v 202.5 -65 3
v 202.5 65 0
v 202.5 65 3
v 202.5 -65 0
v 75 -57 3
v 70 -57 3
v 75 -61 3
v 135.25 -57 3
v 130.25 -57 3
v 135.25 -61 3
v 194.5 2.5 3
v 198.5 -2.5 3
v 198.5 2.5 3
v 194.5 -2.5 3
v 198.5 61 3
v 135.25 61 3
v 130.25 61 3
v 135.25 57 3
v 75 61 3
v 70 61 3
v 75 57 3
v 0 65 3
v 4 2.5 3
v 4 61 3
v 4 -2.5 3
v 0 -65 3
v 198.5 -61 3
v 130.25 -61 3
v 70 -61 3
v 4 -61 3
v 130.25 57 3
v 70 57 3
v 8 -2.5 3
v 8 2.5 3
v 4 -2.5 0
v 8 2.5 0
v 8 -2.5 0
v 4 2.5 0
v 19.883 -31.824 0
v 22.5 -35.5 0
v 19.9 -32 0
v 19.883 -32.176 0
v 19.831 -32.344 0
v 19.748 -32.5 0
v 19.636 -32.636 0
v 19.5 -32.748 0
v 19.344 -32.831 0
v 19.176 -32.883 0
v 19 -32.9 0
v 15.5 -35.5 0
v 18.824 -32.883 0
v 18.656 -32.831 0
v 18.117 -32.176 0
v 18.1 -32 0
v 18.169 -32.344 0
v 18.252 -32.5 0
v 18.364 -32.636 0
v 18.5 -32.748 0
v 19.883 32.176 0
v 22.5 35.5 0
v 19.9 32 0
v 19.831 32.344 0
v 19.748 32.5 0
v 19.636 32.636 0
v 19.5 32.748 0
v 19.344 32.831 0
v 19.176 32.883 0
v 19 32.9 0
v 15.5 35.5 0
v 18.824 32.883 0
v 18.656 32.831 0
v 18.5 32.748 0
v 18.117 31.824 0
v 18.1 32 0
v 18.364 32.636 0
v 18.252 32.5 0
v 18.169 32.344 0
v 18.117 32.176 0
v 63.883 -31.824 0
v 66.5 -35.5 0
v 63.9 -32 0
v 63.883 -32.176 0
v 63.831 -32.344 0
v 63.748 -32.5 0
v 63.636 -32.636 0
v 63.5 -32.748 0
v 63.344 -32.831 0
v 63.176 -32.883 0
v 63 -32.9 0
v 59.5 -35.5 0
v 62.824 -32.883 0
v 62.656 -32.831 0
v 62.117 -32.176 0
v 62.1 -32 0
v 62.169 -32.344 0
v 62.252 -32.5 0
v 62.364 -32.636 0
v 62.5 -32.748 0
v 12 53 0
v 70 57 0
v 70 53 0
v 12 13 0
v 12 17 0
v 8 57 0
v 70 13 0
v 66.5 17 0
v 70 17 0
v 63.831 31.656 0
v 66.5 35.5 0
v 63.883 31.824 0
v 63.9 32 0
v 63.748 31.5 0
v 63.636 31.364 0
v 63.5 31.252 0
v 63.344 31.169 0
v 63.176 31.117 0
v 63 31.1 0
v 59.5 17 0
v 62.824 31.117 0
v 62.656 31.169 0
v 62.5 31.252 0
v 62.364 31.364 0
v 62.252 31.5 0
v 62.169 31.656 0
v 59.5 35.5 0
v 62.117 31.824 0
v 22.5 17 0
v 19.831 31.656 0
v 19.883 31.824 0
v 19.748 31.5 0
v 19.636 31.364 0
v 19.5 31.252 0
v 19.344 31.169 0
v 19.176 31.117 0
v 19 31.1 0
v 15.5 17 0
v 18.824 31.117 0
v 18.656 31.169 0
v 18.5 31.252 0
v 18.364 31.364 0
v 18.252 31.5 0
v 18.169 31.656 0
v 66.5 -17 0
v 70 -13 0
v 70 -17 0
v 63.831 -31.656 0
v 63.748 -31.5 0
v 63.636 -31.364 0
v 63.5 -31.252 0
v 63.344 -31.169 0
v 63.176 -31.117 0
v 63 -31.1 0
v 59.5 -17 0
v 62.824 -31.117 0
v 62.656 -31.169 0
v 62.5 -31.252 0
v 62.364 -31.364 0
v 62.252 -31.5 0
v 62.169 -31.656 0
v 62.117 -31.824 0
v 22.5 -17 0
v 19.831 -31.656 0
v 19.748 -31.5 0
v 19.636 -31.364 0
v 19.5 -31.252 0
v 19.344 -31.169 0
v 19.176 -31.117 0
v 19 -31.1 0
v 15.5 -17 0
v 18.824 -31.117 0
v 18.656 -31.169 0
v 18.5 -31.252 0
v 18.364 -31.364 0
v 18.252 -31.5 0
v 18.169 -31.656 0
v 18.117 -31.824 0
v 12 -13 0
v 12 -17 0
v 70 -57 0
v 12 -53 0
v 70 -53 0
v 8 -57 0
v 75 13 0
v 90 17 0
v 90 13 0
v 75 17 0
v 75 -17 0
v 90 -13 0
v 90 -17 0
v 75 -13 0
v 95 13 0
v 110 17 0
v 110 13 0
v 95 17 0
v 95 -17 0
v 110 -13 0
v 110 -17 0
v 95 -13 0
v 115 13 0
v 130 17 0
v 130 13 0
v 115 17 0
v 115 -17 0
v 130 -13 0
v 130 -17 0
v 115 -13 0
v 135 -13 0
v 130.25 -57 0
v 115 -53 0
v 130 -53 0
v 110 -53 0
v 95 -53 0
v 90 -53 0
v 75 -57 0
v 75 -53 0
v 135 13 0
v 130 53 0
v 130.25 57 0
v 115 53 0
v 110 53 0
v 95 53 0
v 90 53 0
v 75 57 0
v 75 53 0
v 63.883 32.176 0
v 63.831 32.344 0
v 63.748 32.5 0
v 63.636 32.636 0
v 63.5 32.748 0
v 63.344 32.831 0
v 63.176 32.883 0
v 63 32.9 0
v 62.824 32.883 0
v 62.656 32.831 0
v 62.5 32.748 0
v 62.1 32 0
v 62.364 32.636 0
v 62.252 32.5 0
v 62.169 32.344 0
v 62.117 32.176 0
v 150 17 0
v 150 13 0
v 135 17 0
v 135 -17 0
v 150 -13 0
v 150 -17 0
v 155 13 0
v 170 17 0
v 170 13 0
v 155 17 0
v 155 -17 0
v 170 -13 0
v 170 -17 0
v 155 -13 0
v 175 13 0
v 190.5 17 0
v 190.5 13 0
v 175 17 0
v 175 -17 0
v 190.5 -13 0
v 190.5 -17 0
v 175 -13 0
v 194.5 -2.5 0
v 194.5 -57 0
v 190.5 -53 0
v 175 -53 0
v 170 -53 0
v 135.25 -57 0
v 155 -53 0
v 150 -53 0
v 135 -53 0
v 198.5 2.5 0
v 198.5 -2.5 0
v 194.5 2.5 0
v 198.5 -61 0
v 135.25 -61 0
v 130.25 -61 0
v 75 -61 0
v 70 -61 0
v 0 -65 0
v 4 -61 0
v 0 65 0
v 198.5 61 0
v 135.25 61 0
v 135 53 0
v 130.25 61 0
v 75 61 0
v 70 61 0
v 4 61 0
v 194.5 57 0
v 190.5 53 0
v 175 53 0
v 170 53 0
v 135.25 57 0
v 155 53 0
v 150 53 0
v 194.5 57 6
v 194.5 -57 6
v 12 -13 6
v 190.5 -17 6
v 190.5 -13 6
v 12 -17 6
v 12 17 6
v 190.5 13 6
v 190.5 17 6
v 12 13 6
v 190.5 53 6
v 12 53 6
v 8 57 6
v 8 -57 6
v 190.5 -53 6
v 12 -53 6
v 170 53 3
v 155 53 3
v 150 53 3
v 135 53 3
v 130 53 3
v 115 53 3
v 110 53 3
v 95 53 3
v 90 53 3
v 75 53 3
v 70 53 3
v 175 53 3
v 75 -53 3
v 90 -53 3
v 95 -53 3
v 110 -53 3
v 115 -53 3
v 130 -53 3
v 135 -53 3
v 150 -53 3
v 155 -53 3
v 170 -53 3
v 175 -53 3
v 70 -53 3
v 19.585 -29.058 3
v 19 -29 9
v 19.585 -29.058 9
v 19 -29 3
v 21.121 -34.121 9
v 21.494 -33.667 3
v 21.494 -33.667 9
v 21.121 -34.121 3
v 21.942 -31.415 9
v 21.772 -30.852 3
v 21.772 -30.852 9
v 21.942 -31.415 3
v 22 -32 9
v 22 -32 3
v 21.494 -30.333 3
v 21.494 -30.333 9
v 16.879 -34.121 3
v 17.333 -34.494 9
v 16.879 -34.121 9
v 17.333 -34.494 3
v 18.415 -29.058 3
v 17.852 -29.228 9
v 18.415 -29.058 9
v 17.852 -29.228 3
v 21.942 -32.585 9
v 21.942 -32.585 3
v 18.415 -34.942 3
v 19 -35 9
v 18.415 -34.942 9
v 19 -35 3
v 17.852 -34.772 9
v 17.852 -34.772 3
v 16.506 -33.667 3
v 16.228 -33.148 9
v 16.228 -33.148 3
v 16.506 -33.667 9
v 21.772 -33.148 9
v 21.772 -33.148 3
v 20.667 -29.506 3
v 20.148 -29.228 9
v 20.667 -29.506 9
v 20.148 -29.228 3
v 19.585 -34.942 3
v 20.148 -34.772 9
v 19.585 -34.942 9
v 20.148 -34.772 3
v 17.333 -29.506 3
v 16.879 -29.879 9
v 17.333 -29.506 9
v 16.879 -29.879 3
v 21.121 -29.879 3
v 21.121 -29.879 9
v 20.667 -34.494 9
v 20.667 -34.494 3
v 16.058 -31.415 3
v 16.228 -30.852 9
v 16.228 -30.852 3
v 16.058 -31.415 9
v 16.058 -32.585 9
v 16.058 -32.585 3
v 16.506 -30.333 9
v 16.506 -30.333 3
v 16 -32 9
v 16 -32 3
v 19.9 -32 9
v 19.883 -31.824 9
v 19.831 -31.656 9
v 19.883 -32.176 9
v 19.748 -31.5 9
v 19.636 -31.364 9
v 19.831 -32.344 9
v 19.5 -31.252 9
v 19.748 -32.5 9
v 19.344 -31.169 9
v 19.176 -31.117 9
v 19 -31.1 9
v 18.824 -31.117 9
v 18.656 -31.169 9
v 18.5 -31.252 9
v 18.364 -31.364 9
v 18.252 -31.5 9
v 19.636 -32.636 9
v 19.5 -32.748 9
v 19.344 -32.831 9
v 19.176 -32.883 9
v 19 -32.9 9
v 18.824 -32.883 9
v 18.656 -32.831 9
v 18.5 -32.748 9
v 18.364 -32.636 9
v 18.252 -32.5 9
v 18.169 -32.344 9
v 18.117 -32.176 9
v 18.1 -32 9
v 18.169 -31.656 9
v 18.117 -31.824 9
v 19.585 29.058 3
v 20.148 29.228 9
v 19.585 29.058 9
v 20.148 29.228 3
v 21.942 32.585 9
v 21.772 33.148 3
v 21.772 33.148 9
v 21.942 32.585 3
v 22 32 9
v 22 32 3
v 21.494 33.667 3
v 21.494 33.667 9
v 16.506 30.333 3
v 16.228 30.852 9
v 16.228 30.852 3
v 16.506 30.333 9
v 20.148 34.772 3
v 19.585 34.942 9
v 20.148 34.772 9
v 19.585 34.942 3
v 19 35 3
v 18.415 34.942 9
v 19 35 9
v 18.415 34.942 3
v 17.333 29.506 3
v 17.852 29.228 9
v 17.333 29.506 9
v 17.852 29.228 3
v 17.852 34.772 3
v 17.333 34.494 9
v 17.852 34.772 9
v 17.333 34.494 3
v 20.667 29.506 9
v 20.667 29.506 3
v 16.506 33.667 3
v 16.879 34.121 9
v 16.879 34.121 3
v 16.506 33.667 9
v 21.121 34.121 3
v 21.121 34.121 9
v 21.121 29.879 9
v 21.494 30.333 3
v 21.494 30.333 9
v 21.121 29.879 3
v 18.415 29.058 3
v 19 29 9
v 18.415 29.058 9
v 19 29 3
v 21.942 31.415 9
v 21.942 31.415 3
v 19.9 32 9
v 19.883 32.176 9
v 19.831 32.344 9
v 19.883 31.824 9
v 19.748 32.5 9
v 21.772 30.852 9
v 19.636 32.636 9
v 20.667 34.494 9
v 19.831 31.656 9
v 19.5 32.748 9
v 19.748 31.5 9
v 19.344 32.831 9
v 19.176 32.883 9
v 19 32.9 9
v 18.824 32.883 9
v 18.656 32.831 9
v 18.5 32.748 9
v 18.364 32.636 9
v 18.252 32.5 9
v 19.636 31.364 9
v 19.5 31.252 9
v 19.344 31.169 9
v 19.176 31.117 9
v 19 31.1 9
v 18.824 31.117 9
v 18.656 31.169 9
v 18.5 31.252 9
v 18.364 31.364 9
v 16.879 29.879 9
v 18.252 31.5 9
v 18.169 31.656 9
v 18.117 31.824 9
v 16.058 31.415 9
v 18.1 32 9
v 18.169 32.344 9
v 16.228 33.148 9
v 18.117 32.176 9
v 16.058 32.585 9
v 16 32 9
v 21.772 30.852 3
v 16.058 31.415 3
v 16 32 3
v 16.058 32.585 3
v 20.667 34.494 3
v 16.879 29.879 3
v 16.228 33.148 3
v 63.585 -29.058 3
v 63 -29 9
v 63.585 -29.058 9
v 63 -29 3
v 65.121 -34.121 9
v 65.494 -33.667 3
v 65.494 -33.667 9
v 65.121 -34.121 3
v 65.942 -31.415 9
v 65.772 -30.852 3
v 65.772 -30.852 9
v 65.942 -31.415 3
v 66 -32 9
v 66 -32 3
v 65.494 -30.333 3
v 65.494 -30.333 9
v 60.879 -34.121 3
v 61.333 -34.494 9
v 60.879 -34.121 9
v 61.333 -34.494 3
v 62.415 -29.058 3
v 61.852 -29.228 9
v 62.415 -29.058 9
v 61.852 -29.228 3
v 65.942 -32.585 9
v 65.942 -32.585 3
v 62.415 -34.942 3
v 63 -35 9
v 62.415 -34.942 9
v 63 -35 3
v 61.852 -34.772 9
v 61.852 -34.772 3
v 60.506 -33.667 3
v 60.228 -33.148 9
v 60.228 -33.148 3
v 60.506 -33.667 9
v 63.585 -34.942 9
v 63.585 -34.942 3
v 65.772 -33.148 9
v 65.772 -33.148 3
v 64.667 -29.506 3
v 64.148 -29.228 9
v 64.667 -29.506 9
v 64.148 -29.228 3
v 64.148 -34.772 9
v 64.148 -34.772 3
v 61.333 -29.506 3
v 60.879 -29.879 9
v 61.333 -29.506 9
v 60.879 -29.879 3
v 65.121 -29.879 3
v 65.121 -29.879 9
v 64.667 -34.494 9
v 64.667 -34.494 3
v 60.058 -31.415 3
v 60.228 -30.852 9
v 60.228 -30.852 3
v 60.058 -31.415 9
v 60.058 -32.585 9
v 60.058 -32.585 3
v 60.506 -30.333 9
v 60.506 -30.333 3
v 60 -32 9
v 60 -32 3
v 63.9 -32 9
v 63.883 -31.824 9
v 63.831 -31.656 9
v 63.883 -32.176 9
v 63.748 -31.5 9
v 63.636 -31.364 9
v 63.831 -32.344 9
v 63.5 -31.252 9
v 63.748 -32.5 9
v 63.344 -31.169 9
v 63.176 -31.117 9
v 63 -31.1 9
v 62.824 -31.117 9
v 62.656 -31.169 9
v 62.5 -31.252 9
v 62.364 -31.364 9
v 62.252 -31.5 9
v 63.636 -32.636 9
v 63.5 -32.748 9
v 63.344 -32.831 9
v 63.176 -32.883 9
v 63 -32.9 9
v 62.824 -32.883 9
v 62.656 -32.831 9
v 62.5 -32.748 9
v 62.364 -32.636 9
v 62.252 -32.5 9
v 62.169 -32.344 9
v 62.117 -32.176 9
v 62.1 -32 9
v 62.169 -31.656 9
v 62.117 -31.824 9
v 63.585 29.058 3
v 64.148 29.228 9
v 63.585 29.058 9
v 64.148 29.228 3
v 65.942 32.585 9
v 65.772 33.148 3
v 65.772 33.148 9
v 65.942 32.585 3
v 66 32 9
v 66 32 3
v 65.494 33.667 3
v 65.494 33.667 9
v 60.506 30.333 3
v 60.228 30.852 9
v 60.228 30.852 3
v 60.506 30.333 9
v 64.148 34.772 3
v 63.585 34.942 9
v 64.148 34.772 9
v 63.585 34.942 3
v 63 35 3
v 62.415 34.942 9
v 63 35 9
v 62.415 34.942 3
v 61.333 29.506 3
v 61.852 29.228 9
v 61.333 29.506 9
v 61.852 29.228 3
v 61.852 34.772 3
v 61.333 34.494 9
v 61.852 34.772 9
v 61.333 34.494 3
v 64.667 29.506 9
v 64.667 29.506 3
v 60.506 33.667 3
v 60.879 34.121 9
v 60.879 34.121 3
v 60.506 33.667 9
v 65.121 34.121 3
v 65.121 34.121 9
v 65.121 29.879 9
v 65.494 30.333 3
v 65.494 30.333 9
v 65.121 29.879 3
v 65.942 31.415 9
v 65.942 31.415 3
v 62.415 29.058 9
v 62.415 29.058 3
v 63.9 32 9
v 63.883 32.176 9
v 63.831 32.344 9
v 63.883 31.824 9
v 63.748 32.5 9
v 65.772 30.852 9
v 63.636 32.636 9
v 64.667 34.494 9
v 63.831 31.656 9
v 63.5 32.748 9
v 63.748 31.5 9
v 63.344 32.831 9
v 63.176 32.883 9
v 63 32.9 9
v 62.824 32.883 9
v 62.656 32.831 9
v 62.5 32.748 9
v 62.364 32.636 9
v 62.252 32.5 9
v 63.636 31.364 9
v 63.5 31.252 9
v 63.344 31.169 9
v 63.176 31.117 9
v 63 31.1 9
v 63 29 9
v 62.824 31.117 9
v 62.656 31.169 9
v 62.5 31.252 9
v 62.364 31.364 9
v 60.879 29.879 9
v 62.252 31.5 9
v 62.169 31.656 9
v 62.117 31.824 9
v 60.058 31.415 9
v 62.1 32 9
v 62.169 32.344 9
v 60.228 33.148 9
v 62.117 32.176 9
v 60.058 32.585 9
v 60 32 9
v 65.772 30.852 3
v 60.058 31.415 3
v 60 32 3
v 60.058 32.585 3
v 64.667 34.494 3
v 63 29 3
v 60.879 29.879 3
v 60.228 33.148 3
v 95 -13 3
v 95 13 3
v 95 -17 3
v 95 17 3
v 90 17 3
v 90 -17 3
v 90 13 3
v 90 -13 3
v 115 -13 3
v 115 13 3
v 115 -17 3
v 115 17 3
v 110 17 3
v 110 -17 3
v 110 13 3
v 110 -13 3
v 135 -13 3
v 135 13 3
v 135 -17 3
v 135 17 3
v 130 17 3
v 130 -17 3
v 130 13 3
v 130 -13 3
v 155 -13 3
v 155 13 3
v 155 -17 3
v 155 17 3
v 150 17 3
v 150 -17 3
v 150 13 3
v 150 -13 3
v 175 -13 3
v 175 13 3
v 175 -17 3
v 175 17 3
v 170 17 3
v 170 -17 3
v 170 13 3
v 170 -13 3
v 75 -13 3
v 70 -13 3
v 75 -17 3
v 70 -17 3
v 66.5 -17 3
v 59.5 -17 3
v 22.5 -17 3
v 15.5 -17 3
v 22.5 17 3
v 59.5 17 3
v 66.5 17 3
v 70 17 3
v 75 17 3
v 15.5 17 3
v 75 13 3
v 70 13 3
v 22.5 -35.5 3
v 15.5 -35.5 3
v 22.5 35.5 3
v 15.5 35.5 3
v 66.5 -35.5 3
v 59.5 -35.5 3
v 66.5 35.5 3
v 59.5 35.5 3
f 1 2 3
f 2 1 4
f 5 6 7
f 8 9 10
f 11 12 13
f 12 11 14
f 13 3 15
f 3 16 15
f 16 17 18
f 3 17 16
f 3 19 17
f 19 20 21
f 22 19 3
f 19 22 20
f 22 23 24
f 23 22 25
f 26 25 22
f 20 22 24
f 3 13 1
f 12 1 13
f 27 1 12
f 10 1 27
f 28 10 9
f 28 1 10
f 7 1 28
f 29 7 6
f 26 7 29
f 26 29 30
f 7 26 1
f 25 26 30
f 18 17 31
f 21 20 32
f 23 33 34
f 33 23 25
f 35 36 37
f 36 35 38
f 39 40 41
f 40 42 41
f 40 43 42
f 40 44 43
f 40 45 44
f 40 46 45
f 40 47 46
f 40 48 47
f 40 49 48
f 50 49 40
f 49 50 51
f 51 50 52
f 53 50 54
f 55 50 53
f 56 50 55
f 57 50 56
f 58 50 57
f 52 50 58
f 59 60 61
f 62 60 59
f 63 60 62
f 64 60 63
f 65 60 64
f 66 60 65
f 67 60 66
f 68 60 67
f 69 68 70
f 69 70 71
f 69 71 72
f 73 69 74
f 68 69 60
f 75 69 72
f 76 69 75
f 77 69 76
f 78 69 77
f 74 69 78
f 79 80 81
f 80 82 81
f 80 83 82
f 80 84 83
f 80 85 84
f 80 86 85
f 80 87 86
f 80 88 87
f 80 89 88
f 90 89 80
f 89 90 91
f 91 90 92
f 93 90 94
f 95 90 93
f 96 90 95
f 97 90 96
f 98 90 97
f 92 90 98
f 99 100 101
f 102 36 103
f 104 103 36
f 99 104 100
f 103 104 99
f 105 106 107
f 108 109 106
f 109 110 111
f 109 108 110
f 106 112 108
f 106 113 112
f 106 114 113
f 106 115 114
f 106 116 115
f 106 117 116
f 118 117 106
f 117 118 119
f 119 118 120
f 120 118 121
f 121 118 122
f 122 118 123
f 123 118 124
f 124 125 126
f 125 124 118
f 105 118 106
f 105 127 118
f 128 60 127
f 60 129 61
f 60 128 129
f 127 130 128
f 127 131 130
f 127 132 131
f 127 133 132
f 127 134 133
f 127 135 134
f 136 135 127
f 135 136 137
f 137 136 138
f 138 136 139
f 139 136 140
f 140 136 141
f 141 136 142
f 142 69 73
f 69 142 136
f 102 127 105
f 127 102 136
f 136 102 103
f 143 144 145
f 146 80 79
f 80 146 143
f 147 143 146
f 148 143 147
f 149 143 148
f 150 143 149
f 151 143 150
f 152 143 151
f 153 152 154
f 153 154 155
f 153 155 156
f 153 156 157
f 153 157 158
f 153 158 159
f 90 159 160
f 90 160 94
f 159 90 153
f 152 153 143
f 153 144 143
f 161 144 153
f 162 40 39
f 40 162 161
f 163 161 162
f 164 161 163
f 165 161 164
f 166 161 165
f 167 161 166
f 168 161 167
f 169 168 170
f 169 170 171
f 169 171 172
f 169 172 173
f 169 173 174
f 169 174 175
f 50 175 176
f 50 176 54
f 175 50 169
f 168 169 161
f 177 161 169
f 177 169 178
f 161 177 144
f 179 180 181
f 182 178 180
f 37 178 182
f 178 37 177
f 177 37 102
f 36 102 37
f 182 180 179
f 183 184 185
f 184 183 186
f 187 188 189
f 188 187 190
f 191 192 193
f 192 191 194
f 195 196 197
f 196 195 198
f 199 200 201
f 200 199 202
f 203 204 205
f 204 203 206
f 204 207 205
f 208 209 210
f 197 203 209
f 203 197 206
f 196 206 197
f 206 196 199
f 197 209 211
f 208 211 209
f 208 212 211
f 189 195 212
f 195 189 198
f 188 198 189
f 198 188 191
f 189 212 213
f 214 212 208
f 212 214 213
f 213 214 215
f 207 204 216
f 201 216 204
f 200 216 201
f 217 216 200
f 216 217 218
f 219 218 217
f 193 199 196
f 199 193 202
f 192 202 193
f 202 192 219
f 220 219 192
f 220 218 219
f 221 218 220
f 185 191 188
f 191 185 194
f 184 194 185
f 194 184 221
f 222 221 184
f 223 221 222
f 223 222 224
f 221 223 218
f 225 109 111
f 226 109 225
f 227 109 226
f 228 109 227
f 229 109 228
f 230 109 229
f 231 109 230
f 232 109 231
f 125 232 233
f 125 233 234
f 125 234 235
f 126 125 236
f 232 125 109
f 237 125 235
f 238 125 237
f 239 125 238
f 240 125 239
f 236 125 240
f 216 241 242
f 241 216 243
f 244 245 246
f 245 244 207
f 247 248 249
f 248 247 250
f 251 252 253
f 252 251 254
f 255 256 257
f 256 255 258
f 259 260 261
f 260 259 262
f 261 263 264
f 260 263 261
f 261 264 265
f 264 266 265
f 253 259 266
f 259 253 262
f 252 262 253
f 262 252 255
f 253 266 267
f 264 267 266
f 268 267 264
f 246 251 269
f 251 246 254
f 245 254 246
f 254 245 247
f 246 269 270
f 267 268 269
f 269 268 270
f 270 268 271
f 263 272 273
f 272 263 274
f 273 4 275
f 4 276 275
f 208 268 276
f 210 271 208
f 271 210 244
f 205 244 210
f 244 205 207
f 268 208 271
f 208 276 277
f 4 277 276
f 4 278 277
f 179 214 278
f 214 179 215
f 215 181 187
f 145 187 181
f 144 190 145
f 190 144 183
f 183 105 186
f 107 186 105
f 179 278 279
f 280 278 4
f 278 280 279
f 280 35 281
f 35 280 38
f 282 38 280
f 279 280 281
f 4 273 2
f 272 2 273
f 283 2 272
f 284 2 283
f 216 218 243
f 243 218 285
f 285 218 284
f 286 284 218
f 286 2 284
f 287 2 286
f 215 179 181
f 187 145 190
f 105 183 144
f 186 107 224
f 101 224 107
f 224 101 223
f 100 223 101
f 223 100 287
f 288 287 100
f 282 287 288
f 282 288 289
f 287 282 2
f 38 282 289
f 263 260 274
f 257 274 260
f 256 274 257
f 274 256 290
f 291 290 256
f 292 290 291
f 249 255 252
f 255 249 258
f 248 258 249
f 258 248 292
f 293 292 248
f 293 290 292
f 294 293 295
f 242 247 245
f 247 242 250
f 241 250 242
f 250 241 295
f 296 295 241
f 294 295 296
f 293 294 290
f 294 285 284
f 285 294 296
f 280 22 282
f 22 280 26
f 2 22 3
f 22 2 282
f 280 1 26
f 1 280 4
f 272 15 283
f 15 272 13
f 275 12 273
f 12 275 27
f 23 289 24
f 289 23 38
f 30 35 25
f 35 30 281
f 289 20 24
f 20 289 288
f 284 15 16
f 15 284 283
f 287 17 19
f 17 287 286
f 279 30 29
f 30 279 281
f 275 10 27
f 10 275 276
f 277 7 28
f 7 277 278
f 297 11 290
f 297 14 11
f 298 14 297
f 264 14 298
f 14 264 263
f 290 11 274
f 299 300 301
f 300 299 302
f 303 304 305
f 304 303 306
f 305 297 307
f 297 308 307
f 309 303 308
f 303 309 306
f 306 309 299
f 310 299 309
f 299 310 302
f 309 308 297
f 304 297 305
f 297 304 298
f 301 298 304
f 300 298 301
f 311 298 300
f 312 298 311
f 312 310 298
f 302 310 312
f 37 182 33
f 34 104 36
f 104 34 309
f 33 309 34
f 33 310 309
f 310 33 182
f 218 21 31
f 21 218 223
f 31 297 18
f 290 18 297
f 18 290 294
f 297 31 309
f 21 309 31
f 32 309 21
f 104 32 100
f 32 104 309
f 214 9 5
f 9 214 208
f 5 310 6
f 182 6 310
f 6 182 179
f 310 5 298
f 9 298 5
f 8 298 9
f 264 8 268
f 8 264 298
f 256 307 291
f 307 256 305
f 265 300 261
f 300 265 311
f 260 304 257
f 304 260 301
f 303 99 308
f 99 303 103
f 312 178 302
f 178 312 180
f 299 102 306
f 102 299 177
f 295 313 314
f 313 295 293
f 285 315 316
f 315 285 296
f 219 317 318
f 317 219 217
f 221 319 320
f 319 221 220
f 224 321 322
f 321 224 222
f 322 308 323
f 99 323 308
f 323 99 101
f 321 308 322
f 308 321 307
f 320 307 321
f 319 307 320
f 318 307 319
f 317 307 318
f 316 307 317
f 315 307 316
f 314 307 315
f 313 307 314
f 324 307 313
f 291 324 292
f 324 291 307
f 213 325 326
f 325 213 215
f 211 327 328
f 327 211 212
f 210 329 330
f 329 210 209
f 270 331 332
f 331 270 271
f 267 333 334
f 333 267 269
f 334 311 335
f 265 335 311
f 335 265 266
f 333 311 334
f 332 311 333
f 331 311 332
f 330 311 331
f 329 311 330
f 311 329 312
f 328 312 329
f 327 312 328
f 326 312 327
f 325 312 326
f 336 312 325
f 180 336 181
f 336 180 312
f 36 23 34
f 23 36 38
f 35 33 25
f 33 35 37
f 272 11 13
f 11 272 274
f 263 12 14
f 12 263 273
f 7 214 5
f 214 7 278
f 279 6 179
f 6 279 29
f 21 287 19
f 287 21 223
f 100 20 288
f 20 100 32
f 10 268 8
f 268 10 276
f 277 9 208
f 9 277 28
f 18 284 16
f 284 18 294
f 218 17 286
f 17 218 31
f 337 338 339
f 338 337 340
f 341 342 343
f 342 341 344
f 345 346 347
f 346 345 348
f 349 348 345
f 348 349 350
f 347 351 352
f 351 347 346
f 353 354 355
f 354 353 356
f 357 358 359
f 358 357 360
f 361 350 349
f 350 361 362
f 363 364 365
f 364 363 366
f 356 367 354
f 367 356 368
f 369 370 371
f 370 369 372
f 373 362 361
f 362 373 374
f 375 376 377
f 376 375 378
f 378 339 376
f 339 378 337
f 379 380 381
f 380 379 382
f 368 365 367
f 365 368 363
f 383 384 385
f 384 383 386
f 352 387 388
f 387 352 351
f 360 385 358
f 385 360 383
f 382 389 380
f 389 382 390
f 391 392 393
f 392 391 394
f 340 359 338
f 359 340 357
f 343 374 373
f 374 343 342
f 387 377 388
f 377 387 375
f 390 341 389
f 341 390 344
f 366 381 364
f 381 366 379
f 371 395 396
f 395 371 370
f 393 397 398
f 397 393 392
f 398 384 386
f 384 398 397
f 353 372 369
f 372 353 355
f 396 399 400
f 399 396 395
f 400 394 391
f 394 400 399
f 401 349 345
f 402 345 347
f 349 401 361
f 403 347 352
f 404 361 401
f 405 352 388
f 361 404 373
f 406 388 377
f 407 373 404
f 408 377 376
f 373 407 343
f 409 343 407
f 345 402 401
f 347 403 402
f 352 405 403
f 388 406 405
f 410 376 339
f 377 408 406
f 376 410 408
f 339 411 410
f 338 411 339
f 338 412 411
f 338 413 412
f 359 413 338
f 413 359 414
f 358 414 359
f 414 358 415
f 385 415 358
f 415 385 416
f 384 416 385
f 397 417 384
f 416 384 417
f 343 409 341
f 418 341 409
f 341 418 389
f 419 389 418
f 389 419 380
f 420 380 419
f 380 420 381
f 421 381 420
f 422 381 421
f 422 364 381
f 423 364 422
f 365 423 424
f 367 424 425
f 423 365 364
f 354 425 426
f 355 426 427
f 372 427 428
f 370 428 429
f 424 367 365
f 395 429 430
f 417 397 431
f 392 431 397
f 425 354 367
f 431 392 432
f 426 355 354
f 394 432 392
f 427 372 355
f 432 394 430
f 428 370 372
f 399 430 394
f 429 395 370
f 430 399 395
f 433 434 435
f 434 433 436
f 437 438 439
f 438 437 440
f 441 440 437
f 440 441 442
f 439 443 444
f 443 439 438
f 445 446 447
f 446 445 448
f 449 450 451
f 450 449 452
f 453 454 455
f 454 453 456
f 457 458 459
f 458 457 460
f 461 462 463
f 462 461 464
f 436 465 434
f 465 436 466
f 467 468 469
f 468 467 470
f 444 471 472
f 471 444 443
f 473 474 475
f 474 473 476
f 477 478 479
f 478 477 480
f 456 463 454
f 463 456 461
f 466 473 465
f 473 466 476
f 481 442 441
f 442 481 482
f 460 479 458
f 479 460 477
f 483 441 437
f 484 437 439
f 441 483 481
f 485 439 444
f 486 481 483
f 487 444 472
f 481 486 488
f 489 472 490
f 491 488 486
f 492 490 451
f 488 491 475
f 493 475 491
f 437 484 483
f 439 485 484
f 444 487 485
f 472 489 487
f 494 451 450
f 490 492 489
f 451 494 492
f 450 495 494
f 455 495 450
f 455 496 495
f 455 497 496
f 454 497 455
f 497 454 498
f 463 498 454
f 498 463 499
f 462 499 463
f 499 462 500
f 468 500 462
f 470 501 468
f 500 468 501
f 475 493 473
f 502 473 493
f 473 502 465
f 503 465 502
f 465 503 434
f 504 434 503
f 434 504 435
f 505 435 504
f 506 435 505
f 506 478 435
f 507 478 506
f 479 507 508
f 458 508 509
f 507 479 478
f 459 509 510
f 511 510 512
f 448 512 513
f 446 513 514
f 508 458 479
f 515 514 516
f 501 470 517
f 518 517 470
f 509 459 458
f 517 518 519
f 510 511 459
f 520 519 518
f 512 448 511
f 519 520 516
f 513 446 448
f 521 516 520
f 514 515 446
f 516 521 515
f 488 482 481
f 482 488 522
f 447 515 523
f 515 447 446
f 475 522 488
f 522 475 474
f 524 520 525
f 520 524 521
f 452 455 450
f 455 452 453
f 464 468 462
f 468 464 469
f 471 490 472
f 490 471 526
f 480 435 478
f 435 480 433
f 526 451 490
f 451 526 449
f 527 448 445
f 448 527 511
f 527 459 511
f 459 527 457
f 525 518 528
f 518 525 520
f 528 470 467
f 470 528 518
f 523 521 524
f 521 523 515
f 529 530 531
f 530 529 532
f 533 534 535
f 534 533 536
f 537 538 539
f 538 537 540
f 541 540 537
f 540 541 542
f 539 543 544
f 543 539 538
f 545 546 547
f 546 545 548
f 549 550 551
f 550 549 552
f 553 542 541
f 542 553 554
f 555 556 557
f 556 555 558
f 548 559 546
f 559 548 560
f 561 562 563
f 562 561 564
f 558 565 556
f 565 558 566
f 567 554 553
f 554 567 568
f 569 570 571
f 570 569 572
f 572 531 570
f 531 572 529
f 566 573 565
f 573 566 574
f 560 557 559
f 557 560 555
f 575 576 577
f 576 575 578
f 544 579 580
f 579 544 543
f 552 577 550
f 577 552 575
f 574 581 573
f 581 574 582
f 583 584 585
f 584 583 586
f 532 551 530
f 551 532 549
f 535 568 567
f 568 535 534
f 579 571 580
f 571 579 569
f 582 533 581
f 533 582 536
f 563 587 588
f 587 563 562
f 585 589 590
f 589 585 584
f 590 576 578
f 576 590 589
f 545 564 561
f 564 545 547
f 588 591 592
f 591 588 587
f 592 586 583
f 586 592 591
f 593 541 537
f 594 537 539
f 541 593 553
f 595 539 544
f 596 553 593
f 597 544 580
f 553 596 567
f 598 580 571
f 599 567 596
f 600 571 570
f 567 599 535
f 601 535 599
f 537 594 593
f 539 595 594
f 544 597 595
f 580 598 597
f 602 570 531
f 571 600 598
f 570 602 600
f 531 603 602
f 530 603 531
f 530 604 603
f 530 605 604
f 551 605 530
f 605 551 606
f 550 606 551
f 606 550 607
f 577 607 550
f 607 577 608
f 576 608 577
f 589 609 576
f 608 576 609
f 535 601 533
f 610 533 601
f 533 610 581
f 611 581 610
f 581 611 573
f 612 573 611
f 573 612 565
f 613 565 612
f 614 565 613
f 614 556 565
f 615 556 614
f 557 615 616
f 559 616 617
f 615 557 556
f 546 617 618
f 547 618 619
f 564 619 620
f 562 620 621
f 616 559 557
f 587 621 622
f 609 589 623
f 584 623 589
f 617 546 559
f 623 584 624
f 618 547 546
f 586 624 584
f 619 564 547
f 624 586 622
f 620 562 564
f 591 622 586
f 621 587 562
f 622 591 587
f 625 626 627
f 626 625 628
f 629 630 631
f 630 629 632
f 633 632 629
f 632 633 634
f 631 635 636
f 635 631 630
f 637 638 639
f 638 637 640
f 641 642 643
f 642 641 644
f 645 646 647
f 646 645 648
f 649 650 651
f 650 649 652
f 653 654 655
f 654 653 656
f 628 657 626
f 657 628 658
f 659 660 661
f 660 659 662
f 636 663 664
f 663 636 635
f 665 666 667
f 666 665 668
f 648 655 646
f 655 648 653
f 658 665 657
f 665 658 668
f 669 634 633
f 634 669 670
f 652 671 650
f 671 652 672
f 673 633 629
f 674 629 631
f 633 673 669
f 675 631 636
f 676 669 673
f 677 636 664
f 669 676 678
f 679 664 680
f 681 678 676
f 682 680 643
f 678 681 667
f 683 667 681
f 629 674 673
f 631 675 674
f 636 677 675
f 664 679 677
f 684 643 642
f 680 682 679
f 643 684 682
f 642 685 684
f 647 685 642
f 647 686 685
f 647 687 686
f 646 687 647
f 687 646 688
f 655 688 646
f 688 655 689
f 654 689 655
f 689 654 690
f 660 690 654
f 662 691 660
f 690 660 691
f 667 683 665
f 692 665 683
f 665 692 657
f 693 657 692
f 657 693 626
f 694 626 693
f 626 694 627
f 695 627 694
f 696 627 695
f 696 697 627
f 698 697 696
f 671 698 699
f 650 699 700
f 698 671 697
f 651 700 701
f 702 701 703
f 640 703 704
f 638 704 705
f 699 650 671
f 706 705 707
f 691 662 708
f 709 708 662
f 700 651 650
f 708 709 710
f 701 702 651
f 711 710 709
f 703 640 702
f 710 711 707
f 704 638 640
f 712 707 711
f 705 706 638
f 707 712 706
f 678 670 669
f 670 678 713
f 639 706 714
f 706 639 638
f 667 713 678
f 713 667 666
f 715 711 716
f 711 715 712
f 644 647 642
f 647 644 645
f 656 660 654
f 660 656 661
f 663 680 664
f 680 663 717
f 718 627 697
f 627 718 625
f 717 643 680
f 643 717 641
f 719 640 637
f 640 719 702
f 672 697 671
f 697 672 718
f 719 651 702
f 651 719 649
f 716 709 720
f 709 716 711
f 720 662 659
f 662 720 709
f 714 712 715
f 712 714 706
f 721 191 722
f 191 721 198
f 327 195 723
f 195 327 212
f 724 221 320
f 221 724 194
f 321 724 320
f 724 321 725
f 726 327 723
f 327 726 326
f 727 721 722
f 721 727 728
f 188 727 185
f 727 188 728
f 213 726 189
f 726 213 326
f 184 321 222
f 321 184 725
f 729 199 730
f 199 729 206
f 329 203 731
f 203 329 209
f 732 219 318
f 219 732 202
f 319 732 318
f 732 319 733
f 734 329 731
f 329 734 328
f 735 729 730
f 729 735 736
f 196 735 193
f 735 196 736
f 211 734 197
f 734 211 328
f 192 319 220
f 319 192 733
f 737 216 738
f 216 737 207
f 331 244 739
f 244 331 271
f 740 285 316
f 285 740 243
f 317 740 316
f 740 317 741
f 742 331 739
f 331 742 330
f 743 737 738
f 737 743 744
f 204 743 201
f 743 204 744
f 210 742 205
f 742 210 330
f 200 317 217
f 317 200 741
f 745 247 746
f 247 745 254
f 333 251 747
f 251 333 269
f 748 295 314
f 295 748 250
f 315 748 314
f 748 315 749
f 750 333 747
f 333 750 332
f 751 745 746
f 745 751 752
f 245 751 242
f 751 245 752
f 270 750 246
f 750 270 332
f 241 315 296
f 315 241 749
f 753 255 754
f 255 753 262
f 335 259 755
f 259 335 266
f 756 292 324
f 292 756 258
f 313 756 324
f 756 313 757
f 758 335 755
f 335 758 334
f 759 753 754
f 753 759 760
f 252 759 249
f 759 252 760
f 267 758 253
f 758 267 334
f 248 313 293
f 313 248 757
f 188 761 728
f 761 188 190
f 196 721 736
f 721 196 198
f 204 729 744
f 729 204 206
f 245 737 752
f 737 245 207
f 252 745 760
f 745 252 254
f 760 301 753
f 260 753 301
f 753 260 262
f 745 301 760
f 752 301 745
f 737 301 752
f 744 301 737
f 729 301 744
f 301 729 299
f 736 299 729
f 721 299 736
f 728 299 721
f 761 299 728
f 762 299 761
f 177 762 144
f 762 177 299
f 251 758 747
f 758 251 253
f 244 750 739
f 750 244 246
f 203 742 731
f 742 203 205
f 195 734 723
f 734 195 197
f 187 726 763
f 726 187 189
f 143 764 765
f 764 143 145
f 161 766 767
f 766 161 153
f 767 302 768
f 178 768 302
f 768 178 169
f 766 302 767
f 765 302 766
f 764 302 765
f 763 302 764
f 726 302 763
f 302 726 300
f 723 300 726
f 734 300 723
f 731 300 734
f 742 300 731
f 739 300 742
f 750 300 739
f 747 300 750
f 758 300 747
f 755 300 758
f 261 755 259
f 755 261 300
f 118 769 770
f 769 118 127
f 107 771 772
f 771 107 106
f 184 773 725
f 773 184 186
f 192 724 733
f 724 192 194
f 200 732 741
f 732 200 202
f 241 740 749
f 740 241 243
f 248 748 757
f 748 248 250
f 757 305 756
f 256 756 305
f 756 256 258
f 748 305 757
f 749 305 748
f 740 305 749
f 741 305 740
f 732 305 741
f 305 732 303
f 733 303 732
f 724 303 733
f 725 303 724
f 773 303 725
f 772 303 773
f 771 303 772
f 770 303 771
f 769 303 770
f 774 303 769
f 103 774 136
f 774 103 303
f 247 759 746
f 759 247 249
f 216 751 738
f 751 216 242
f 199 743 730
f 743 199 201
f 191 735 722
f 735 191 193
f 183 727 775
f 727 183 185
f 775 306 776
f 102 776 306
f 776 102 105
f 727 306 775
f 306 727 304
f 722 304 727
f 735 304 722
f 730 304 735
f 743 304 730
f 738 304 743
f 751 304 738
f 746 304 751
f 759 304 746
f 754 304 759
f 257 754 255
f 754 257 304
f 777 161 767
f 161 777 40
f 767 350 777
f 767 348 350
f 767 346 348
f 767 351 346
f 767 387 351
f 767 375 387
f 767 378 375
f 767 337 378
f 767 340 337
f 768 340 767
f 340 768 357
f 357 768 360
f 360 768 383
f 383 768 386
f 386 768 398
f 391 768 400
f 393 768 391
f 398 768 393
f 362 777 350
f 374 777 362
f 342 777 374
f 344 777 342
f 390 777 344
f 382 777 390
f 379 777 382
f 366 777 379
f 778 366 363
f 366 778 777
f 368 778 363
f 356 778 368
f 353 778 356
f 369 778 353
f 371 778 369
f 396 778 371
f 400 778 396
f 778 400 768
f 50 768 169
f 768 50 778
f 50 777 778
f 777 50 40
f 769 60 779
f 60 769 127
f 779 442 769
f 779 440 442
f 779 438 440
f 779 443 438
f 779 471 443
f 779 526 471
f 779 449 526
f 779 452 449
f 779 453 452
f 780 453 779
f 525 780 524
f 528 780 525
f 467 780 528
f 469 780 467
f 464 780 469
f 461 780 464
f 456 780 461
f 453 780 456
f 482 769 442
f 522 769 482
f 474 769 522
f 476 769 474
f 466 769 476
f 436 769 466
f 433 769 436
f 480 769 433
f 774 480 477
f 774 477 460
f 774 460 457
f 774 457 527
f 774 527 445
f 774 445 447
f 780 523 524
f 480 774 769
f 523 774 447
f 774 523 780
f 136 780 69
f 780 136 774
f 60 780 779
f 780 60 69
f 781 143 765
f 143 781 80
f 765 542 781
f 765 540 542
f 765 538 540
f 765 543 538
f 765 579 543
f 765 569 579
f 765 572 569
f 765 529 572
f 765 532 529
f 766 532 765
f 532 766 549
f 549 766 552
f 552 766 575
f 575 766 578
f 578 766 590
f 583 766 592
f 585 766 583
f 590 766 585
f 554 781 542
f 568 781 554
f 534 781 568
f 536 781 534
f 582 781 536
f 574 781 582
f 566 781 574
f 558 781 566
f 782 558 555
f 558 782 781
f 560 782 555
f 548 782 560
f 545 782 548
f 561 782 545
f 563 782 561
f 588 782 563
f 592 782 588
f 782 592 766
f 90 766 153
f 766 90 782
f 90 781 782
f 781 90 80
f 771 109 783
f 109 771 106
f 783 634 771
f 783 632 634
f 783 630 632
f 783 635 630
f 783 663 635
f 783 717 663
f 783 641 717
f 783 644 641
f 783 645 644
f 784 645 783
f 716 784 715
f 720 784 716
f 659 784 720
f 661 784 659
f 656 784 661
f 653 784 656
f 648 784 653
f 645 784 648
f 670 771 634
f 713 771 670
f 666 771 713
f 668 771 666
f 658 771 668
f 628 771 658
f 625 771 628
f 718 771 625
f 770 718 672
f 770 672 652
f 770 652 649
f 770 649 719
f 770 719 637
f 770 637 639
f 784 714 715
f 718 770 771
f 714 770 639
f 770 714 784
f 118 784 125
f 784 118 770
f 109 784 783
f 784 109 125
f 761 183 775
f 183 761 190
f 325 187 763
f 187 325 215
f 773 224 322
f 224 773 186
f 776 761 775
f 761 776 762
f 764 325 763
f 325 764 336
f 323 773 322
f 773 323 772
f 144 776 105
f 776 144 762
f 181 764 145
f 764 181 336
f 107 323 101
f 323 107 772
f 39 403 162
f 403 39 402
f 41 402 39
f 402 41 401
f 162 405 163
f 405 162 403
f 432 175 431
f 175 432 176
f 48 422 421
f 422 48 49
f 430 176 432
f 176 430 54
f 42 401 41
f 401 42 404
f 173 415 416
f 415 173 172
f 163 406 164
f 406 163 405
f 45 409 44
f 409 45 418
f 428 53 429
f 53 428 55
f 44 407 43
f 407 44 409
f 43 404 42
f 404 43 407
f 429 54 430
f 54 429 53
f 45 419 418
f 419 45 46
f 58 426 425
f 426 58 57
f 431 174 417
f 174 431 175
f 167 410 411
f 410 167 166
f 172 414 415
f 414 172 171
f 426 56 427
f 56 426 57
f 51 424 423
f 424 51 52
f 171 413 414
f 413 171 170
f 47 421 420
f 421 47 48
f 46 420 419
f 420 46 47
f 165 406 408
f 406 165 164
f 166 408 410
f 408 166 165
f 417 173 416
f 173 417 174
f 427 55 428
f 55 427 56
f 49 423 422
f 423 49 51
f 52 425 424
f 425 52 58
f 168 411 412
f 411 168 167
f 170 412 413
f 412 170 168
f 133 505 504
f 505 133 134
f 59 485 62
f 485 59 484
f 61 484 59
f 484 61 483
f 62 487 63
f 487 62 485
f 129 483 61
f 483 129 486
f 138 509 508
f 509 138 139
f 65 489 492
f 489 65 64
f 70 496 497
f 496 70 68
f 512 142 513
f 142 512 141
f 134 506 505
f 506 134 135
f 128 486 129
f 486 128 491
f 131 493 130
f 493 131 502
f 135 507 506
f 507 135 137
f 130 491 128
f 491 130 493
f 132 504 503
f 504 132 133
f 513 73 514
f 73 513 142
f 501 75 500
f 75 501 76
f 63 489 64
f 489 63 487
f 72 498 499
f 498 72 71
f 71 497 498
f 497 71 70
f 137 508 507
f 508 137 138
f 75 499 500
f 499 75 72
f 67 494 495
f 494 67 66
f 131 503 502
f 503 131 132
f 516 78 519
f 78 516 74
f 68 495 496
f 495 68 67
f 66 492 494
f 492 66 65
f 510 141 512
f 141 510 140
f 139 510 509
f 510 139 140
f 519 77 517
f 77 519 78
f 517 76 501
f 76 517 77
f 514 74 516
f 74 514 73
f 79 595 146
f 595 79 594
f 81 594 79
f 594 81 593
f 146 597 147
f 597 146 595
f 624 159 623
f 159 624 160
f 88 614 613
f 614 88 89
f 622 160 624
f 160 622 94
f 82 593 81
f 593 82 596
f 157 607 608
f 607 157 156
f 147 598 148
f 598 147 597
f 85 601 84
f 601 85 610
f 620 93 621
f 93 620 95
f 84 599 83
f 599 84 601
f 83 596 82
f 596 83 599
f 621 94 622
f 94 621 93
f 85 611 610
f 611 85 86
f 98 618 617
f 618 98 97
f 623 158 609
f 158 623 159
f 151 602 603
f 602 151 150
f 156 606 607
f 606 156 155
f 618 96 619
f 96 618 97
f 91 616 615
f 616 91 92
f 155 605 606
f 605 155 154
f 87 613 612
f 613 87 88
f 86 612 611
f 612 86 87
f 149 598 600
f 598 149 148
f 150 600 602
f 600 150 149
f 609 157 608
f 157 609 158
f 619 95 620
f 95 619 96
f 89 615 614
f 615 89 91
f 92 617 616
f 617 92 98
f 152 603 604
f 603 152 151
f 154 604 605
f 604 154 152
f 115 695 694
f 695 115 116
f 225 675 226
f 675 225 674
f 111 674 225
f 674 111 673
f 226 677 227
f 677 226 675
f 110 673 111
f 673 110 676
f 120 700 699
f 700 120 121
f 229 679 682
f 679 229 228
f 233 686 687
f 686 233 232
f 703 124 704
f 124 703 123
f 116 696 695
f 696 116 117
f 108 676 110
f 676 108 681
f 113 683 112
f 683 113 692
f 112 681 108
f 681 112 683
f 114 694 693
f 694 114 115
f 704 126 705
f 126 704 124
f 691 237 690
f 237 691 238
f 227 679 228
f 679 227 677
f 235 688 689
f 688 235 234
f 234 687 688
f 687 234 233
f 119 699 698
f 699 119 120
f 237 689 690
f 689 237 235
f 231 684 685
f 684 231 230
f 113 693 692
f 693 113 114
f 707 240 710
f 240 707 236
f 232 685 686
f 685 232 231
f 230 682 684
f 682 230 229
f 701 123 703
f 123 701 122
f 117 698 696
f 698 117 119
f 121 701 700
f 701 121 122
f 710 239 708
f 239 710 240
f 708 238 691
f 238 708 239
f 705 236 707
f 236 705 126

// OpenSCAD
// ======================================================================
//  РАМА-КАРКАС (за ескізом команди) · sosny · BEST EC Day 2 (TD)
//
//  Зовнішній контур → щілина під стяжки → внутрішній контур (з'єднані
//  перемичками). Всередині ззаду — суцільний майданчик під плату
//  YS 5CM*7CM на 4 стійках, далі поперечна балка, далі ламелі з
//  проміжками під стяжки та модулі. Перед = +X.
//
//  !!! ПЕРЕВІРИТИ ШТАНГЕНЦИРКУЛЕМ: pcb_hole_dx, pcb_hole_dy, pcb_hole_d !!!
//
//  ШВИДКА ВЕРСІЯ: висота 3 мм, контури 4 мм, 5 ламелей (крок 20 мм),
//  під платою нічого поперечного: стійки на вушках від 2 поздовжніх балок.
//  ЖОРСТКІСТЬ: внутрішній контур і 2 поздовжні балки — ребра rib_h = 6 мм
//  (ростуть ВГОРУ, низ рами плаский — висоти тримачів і датчиків не змінюються).
//  З 3 мм рама між осями прогиналась ~2 мм під 1 кг, ніс із датчиками
//  підскакував на ~3 мм; з ребрами 6 мм — ~0.3 мм.
//  РОЗКЛАДКА (крок 20, рахуємо від балки за платою = №0):
//    вільні колеса  — №0 + №1   (вісь x ≈ 82.5)
//    мотори         — №3 + №4   (вал уперед, вісь x ≈ 180.5)
//    датчики        — №5 + передній внутрішній контур (сенсори ~40 мм перед віссю)
//  Друк: PLA 0.28, 3 стінки, 4 шари верх/низ, 15 % infill, без підтримок
//  (бруски 4–5 мм виходять майже суцільними — це і дає міцність).
// ======================================================================

// --- габарит ---
len_x   = 202.5;  // довжина: передній внутрішній контур рівно на кроці 20 від ламелі №5
wid_y   = 130;    // ширина
frame_h = 3;      // висота зовнішнього контуру, перемичок і поперечної балки
rib_h   = 6;      // висота ребер жорсткості: внутрішній контур + 2 поздовжні балки

// --- контури ---
rim_out = 4;      // ширина зовнішнього контуру
gap     = 4;      // щілина між контурами (стяжки до 3.6 мм)
rim_in  = 4;      // ширина внутрішнього контуру
bridge  = 5;      // ширина перемичок між контурами

// --- майданчик під плату ---
pcb_w        = 50;     // плата вздовж руху (X)
pcb_l        = 70;     // плата поперек (Y)
pad_margin   = 4;      // запас навколо плати по X
pad_h        = 3;      // товщина майданчика / брусків
pad_solid    = false;  // true = суцільний майданчик під платою (довше друкується)
pcb_hole_dx  = 44;     // між центрами отворів по X
pcb_hole_dy  = 64;     // між центрами отворів по Y
stand_h      = 6;      // висота стійки (зазор під пайку)
stand_od     = 6;
screw_d      = 1.8;    // саморіз М2 (для М3 → 2.6)

// --- балка-розділювач і ламелі ---
div_w    = 5;      // поперечна балка за платою = «ламель №0» (крок 20 до №1)
slat_w   = 5;      // ширина ламелі
slat_h   = 3;      // висота ламелі
n_slats  = 5;      // ламелі №1…№5
slat_pitch = 20;   // = крок прорізів у всіх тримачах

// --- поздовжні балки (жорсткість) ---
long_y   = 15;     // ±15: не перекриває прорізи тримачів (мотор/колесо ±30…35, датчики ±17.5…22)
long_w   = 4;
arm_w    = 7;      // короткі вушка від балки до стійок плати

$fn = 32;

off      = rim_out + gap + rim_in;           // від краю до вікна
win_y    = wid_y - 2*off;                    // ширина вікна
pad_x0   = off;
pad_len  = pcb_w + 2*pad_margin;
div_x0   = pad_x0 + pad_len;
slat_x0  = div_x0 + div_w;                   // початок зони ламелей
slat_x1  = len_x - off;                      // кінець зони ламелей
div_c    = div_x0 + div_w/2;                 // центр балки-розділювача
pcb_cx   = pad_x0 + pad_len/2;

module ring(x0, y0, lx, ly, w, h) {
    difference() {
        translate([x0, y0, 0]) cube([lx, ly, h]);
        translate([x0 + w, y0 + w, -1]) cube([lx - 2*w, ly - 2*w, h + 2]);
    }
}

difference() {
    union() {
        // зовнішній контур (3 мм) і внутрішній контур (ребро rib_h)
        ring(0, -wid_y/2, len_x, wid_y, rim_out, frame_h);
        ring(rim_out + gap, -wid_y/2 + rim_out + gap,
             len_x - 2*(rim_out + gap), wid_y - 2*(rim_out + gap), rim_in, rib_h);
        // перемички: зад і перед по центру, боки — на балці і посередині ламелей
        for (x = [rim_out - 0.5, len_x - rim_out - gap - 0.5])
            translate([x, -bridge/2, 0]) cube([gap + 1, bridge, frame_h]);
        for (xc = [div_c, (slat_x0 + slat_x1)/2], s = [-1, 1])
            translate([xc - bridge/2, s > 0 ? wid_y/2 - rim_out - gap - 0.5
                                            : -wid_y/2 + rim_out - 0.5, 0])
                cube([bridge, gap + 1, frame_h]);
        // майданчик під плату + стійки
        if (pad_solid)
            translate([pad_x0 - 0.5, -win_y/2 - 0.5, 0]) cube([pad_len + 1, win_y + 1, pad_h]);
        for (sx = [-1, 1], sy = [-1, 1])
            translate([pcb_cx + sx*pcb_hole_dx/2, sy*pcb_hole_dy/2, 0])
                cylinder(d = stand_od, h = pad_h + stand_h);
        // поперечна балка
        translate([div_x0, -win_y/2 - 0.5, 0]) cube([div_w, win_y + 1, frame_h]);
        // ламелі
        for (i = [1 : n_slats])
            translate([div_c + i*slat_pitch - slat_w/2, -win_y/2 - 0.5, 0])
                cube([slat_w, win_y + 1, slat_h]);
        // 2 поздовжні балки-ребра через усю раму (від заднього до переднього
        // внутрішнього контуру); під платою — нижче за стійки (rib_h < pad_h + stand_h)
        for (sy = [-1, 1])
            translate([off - 0.5, sy*long_y - long_w/2, 0])
                cube([len_x - 2*off + 1, long_w, rib_h]);
        // вушка: стійки плати стоять на них (поперечних планок під платою немає)
        for (sx = [-1, 1], sy = [-1, 1])
            translate([pcb_cx + sx*pcb_hole_dx/2 - arm_w/2, sy > 0 ? long_y : -pcb_hole_dy/2 - arm_w/2, 0])
                cube([arm_w, pcb_hole_dy/2 + arm_w/2 - long_y, frame_h]);
    }
    for (sx = [-1, 1], sy = [-1, 1])
        translate([pcb_cx + sx*pcb_hole_dx/2, sy*pcb_hole_dy/2, -1])
            cylinder(d = screw_d, h = pad_h + stand_h + 2);
}
